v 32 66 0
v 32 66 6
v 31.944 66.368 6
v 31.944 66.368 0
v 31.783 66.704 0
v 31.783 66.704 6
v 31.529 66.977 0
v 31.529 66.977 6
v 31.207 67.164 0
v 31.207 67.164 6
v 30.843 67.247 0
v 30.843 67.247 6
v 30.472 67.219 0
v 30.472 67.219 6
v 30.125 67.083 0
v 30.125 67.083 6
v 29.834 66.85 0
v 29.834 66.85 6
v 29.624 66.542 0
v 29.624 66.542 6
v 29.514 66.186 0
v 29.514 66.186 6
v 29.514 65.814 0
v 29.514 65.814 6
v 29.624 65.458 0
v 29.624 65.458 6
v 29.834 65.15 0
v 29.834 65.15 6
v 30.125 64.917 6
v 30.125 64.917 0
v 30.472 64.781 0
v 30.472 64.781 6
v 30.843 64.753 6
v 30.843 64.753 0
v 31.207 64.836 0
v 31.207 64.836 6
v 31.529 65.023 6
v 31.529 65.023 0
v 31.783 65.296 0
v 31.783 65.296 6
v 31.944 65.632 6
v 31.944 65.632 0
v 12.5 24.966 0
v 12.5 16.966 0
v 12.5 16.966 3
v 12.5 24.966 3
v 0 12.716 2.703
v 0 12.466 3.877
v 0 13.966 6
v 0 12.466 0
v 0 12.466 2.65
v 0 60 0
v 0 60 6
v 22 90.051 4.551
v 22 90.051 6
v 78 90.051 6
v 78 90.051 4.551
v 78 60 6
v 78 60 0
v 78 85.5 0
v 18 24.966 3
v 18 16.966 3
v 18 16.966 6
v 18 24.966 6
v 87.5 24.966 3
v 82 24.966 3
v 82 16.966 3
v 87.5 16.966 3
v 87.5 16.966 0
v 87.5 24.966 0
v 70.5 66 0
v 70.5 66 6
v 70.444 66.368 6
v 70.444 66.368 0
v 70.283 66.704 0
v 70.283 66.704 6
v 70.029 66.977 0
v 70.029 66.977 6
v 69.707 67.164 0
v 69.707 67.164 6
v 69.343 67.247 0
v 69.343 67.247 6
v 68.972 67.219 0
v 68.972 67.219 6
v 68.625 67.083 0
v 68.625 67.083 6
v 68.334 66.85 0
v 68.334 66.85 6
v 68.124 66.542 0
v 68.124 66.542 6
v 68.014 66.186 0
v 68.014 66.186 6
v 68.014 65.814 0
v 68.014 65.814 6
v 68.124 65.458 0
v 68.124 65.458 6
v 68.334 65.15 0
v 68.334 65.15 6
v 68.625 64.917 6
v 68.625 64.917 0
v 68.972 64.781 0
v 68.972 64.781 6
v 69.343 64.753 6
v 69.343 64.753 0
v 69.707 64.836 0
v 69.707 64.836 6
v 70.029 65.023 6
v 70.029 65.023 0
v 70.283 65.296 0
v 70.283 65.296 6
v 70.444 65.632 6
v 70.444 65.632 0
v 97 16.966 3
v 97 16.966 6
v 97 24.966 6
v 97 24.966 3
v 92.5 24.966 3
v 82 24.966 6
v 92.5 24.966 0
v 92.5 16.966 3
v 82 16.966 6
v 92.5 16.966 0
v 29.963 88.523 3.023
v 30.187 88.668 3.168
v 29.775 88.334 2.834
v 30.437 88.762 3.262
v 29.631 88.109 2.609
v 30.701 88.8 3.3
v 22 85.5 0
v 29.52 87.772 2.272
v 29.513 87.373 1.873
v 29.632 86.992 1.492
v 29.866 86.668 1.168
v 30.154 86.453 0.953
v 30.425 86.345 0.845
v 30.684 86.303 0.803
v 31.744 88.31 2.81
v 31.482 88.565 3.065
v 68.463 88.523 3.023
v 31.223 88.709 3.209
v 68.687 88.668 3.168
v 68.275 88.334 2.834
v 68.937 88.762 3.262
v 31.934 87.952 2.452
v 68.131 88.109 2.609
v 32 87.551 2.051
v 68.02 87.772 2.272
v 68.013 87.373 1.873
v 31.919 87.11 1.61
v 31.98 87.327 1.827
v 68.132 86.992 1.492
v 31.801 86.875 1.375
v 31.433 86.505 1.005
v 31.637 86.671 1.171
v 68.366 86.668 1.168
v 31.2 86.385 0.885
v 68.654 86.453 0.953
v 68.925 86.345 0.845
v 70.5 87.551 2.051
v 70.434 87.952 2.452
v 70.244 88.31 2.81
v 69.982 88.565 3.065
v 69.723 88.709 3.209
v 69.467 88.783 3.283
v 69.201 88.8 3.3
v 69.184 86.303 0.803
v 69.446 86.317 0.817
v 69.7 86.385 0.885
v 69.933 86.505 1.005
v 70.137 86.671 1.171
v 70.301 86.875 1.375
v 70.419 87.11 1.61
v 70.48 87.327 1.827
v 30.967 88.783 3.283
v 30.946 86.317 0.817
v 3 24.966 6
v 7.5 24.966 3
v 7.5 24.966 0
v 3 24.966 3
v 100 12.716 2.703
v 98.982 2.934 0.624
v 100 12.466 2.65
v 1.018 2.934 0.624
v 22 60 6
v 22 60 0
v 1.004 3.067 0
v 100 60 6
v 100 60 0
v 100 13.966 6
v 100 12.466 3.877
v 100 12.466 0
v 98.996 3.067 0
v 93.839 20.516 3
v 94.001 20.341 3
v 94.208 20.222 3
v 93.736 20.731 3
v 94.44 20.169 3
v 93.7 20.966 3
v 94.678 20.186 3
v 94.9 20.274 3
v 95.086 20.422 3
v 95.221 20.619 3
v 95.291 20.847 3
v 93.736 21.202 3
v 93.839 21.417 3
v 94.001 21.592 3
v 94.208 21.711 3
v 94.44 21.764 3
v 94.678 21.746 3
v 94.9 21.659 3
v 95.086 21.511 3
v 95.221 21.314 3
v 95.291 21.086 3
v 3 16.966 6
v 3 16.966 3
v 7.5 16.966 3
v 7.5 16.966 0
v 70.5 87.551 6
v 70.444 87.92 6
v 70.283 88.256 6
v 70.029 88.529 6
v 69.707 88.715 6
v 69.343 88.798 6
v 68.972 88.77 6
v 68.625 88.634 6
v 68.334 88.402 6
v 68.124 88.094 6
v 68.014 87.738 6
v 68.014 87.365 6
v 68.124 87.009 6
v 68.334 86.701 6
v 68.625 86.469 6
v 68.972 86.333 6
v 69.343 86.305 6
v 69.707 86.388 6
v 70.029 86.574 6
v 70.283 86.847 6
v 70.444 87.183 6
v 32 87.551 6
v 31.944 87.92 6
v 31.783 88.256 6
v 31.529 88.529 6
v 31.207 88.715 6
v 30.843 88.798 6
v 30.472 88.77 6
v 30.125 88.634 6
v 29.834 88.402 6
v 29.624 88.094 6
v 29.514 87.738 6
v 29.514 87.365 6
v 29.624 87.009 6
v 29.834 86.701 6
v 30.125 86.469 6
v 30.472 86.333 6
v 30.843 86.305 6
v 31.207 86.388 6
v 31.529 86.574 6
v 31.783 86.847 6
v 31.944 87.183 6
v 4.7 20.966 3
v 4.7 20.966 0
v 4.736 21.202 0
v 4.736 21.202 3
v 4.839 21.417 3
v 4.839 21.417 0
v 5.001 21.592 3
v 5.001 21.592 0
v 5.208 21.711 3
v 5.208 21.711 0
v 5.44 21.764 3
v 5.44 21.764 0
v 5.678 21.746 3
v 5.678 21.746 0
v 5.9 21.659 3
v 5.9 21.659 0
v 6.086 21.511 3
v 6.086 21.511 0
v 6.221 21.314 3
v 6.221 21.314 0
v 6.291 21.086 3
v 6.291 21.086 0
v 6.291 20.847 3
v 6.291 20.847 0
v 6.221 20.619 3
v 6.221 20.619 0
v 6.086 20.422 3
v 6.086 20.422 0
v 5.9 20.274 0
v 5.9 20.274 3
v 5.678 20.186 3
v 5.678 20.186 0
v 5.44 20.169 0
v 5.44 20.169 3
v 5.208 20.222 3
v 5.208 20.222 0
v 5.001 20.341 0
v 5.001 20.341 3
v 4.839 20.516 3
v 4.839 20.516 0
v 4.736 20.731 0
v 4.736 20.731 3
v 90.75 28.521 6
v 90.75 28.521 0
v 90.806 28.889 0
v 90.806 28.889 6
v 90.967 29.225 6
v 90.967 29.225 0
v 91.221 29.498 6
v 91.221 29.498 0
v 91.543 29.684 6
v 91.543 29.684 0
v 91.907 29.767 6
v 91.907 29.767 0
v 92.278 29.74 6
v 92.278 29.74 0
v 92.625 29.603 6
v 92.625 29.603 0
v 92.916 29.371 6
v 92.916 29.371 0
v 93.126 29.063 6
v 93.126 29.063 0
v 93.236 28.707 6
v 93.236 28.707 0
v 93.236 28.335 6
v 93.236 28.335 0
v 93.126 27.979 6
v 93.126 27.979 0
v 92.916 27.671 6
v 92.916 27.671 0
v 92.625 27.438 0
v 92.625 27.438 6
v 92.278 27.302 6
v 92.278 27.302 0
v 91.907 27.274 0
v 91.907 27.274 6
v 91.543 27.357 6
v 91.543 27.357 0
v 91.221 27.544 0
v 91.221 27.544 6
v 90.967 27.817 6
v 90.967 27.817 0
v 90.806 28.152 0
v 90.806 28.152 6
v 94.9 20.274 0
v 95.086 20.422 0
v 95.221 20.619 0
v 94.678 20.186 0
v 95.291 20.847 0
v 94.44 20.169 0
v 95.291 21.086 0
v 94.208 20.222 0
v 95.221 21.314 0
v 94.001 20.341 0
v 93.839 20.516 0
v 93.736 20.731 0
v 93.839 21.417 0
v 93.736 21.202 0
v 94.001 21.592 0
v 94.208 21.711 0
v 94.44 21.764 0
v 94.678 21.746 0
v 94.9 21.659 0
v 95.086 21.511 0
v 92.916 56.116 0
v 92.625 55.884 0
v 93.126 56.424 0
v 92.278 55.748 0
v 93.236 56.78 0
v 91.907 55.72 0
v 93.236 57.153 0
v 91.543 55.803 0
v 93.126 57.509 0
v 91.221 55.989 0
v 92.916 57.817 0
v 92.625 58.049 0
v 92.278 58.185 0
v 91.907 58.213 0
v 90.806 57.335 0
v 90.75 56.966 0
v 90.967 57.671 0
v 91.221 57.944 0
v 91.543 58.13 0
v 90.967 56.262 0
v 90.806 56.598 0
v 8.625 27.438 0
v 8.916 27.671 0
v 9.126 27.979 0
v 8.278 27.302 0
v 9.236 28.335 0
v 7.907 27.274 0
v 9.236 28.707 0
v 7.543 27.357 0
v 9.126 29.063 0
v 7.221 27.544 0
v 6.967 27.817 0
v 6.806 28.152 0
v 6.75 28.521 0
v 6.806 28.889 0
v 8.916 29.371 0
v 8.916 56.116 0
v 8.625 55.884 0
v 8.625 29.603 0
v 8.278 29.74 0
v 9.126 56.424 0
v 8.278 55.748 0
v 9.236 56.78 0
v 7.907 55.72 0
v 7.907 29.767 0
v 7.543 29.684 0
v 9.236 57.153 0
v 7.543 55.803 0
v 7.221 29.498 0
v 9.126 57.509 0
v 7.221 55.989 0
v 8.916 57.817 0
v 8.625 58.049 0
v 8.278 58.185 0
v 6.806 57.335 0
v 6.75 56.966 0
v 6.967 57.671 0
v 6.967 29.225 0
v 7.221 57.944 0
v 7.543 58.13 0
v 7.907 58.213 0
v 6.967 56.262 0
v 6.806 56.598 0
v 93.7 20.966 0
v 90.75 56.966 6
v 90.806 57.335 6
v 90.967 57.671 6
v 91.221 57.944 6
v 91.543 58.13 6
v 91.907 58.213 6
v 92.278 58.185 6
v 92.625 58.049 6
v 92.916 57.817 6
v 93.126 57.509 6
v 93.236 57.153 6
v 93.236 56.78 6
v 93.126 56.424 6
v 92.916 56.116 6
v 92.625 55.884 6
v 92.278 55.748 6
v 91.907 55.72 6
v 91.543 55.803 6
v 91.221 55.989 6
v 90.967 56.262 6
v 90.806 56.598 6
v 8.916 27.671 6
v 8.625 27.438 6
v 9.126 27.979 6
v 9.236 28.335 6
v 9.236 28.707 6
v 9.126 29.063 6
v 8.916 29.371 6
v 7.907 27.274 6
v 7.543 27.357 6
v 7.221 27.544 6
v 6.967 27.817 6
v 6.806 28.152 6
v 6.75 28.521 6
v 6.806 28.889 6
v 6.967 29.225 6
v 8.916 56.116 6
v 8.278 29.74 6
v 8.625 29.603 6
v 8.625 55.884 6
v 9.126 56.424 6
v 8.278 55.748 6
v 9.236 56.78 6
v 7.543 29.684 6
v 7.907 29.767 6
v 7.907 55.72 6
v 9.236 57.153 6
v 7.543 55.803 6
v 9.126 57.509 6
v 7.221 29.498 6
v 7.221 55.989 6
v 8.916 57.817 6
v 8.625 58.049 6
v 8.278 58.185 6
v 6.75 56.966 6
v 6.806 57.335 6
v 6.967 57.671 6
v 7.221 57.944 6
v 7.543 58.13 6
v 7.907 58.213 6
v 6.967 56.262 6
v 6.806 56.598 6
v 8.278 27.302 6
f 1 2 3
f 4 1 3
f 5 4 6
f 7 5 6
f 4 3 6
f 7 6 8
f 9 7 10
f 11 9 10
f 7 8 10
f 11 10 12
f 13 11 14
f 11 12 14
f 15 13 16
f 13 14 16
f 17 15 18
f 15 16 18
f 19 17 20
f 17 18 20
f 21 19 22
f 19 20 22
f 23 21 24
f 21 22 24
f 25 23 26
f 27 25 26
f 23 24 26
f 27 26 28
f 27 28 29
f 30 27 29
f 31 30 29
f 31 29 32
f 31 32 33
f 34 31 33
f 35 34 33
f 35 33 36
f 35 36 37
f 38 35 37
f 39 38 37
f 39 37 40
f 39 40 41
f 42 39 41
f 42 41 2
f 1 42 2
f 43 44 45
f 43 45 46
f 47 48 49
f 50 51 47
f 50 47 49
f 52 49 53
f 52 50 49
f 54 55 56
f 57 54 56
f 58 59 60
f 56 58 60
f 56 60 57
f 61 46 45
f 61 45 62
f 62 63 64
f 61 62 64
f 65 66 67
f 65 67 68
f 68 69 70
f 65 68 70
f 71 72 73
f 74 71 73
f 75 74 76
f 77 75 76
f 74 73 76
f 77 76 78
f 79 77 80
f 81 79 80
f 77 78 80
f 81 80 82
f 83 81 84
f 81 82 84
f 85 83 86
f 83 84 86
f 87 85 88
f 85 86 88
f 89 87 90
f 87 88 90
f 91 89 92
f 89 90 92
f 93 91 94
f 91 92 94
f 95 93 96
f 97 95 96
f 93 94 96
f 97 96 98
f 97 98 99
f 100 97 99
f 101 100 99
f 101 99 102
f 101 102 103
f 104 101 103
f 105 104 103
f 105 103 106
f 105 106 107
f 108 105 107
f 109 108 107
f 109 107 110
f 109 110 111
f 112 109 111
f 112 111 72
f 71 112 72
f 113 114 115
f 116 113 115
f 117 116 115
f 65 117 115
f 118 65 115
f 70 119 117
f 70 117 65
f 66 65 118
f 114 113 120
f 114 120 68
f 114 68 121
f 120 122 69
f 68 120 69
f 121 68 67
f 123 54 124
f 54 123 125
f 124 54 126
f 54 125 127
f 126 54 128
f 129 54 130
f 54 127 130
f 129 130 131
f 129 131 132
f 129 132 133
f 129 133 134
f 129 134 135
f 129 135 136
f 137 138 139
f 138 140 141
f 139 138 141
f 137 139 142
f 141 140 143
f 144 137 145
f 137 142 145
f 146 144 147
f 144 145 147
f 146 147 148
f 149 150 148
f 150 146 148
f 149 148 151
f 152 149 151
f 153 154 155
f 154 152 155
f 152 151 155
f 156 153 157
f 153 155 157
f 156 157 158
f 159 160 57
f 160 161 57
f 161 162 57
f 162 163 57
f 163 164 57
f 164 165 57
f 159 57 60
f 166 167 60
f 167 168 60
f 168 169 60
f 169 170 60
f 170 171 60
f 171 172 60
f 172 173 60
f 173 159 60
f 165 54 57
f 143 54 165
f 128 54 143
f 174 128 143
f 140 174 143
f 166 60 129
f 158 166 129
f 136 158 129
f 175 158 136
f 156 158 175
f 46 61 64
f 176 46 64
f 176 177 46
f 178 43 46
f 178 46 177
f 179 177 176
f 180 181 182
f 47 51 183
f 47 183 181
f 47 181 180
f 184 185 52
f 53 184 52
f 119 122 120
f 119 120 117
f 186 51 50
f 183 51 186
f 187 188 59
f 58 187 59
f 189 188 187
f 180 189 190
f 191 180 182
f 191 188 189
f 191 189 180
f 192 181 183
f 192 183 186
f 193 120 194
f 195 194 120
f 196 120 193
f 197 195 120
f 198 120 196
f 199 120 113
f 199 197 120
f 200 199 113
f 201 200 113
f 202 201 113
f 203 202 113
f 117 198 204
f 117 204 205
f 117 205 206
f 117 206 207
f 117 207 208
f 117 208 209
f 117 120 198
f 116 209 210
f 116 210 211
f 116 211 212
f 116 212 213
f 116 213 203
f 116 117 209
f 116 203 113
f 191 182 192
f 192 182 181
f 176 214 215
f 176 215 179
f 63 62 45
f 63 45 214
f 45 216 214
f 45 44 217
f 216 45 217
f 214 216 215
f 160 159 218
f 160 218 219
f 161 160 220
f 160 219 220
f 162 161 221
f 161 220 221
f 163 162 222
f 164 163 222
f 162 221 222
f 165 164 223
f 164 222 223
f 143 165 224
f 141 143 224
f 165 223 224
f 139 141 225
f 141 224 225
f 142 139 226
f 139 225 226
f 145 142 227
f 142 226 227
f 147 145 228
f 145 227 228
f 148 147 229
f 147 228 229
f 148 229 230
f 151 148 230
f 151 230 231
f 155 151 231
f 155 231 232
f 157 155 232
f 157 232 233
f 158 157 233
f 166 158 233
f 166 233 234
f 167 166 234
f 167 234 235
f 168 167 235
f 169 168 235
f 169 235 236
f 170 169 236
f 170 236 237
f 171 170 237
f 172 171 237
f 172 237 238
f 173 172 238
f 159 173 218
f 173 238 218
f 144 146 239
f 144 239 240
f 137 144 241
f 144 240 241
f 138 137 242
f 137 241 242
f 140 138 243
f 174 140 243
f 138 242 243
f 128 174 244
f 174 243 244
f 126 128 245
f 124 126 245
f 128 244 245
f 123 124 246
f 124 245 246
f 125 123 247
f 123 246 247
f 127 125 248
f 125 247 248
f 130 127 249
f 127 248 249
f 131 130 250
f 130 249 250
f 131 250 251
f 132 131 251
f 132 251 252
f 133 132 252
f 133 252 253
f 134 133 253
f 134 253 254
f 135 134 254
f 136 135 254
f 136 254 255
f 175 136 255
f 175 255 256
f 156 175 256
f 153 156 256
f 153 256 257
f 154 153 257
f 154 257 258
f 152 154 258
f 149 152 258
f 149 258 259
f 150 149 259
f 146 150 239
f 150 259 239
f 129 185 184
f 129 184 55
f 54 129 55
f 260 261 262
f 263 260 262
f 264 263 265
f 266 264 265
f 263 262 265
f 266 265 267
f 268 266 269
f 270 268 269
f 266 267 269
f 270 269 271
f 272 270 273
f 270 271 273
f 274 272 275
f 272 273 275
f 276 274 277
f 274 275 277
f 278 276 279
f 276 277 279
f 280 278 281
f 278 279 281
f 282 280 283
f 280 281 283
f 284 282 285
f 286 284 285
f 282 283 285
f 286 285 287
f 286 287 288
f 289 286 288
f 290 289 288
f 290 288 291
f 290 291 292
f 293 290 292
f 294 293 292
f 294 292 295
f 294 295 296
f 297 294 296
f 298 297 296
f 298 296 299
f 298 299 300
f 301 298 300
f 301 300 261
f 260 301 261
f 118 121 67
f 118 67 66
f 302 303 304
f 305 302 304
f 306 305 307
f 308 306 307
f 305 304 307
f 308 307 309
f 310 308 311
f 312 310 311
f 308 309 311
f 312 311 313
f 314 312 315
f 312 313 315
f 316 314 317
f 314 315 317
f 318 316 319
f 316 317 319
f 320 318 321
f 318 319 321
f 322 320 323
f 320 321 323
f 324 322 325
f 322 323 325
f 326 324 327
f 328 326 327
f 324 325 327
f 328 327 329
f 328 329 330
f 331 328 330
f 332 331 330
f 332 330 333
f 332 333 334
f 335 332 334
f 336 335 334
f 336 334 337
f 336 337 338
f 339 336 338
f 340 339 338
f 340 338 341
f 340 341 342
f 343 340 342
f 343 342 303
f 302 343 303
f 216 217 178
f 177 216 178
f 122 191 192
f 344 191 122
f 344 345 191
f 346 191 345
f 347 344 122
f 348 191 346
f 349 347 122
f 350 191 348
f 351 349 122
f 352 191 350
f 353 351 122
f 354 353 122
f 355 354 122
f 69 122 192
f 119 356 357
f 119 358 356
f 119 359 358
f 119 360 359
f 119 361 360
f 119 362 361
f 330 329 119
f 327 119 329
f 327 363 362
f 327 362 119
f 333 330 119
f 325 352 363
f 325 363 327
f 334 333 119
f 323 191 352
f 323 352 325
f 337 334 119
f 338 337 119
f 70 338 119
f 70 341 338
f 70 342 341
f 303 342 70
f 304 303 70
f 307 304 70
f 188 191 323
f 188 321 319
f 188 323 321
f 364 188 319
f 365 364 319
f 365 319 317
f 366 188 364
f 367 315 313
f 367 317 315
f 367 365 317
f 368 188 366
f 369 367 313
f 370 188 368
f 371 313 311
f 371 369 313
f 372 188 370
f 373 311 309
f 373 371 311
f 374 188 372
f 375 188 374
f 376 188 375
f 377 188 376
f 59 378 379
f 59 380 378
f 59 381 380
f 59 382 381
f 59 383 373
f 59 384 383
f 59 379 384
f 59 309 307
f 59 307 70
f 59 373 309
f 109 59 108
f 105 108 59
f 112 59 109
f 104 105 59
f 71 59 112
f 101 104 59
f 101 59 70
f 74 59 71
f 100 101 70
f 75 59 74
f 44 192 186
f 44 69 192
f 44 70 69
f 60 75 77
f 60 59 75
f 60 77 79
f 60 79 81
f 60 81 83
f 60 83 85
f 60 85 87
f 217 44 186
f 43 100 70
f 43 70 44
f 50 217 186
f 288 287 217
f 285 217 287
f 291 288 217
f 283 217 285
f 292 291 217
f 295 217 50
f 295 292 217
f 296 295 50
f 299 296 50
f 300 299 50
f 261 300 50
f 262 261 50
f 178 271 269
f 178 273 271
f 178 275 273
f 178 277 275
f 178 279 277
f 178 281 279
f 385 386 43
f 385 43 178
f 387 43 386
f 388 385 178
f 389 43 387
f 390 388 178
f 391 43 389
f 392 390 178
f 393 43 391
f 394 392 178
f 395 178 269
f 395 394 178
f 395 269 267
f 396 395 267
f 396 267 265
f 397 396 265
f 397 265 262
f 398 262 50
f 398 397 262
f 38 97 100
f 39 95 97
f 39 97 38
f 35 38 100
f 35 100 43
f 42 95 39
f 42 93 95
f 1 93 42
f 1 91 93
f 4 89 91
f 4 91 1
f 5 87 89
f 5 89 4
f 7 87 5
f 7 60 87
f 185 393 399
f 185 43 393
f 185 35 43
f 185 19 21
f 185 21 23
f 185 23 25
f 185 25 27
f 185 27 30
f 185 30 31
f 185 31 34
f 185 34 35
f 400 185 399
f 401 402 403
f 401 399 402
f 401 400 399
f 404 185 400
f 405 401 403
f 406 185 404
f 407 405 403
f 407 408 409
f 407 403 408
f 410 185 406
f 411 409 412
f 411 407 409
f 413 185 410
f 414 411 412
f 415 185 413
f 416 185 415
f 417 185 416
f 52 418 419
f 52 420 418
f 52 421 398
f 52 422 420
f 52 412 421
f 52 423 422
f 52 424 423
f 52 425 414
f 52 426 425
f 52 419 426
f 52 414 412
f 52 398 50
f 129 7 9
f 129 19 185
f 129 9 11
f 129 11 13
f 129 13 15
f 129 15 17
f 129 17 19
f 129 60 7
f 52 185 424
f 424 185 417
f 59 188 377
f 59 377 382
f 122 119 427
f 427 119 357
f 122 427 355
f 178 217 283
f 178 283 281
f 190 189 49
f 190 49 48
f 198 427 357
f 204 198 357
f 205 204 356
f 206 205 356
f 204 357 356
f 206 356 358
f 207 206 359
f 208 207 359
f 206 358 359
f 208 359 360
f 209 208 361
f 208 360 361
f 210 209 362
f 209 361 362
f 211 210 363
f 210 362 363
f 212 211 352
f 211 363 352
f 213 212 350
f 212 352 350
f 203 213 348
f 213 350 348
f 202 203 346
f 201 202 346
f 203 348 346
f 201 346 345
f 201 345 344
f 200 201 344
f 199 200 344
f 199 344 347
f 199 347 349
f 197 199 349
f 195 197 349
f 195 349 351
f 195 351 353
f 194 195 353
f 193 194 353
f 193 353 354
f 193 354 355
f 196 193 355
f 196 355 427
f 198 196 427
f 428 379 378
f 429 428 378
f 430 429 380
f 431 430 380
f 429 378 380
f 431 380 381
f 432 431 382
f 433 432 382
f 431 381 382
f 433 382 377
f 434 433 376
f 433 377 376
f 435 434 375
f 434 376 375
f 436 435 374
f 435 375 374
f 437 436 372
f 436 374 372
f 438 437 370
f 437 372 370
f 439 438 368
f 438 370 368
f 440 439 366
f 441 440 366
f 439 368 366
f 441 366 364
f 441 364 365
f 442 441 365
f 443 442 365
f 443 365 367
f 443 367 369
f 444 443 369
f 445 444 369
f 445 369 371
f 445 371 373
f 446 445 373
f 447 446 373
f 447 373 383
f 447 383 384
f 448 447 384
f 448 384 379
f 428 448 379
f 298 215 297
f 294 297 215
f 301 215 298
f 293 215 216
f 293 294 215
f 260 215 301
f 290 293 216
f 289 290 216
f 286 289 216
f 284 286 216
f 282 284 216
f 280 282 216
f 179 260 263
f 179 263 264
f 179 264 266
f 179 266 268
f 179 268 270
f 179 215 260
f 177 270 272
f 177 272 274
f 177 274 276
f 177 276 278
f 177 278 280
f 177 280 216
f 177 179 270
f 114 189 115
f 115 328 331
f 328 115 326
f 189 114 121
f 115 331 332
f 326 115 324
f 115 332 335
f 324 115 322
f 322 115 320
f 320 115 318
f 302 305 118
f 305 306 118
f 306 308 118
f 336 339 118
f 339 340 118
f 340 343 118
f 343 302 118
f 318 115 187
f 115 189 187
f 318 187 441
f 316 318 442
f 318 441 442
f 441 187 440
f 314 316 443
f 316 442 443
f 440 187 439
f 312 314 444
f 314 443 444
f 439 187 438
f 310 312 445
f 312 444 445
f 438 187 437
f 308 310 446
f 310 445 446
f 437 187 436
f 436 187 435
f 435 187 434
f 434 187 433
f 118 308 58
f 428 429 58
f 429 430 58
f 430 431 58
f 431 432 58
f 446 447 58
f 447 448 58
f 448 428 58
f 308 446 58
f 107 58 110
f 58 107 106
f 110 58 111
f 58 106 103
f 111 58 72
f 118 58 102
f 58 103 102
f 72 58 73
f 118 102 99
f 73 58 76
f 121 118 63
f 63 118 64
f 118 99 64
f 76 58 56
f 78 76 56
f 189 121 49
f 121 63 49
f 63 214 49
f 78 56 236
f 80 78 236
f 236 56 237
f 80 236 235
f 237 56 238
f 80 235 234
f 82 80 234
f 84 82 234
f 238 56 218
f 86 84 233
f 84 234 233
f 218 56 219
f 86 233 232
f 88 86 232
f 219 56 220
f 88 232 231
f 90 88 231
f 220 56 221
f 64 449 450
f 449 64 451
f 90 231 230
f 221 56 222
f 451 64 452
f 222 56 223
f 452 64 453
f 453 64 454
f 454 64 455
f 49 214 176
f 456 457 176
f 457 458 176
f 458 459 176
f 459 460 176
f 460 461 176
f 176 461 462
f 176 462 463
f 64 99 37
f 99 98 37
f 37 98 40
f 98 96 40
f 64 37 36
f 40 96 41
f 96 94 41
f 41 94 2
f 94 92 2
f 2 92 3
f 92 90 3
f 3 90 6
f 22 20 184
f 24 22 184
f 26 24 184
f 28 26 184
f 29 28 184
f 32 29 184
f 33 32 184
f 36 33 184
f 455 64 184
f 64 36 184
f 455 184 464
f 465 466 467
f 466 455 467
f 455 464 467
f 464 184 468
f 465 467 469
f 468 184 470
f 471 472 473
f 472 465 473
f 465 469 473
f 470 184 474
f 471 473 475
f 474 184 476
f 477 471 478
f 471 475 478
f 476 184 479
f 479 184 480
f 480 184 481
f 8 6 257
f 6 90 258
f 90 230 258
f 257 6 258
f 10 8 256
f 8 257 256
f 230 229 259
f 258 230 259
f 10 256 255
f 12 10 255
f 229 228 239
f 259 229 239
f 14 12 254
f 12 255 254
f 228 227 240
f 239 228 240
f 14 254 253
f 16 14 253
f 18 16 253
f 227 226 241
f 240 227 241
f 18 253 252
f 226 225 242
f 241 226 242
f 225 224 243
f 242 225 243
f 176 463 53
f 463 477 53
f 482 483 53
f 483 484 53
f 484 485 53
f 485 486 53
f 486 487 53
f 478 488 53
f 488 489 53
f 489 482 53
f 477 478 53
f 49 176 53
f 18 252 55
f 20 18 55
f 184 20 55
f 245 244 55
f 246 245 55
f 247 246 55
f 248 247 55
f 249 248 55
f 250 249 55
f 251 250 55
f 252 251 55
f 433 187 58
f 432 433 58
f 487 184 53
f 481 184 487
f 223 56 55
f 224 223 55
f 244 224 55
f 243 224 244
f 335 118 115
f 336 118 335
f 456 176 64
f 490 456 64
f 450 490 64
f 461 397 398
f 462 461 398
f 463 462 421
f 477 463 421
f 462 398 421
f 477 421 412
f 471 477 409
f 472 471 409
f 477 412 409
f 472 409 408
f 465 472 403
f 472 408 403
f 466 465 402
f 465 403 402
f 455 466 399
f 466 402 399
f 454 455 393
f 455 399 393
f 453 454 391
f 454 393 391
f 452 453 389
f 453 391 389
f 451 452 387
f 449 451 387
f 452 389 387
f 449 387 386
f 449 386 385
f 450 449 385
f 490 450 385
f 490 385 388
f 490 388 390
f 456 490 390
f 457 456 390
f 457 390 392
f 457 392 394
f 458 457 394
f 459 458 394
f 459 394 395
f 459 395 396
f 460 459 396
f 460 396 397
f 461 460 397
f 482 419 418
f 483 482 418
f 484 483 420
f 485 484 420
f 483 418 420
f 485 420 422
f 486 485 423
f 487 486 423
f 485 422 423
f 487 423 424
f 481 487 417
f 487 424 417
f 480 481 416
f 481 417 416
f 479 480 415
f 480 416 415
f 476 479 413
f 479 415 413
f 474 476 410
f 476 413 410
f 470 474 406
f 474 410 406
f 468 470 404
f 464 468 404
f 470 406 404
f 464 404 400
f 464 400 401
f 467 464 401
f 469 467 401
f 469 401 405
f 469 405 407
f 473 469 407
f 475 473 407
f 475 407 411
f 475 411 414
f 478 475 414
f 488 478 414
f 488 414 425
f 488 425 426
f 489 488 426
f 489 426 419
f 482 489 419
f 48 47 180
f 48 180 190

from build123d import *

# Parameters (mm, degrees)
RESSALTO_EXTRUS_O1_DEPTH                = 6
CORTE_EXTRUS_O1_DEPTH                   = 100
CORTE_EXTRUS_O2_DEPTH                   = 100
CORTE_EXTRUS_O3_DEPTH                   = 100
FILETE1_R                               = 0.1
CORTE_EXTRUS_O4_DEPTH                   = 100
BROCA_DE_ROSQUEAR_PARA_TARRAXA_DE_M31_D = 2.5
ESBO_O9_W                               = 15
ESBO_O9_H                               = 8
CORTE_EXTRUS_O5_DEPTH                   = 3
ESBO_O10_W                              = 5
ESBO_O10_H                              = 8
CORTE_EXTRUS_O6_DEPTH                   = 3
BROCA_DE_ROSQUEAR_PARA_TARRAXA_DE_M21_D = 1.6
BROCA_DE_ROSQUEAR_PARA_TARRAXA_DE_M32_D = 2.5
ESBO_O15_W                              = 56.265856886
ESBO_O15_H                              = 5.410018906
CORTE_EXTRUS_O7_DEPTH                   = 5
ESBO_O16_W                              = 22
ESBO_O16_H                              = 2
CORTE_EXTRUS_O8_DEPTH                   = 10
CORTE_EXTRUS_O9_DEPTH                   = 100


with BuildPart() as part:
    # Esboço1 → Ressalto-extrusão1 (new body)
    with BuildSketch(Plane.XY):
        Polygon((0, 62), (22, 62), (22, 96), (78, 96), (78, 62), (100, 62), (100, 0), (0, 0), align=None)
    extrude(amount=RESSALTO_EXTRUS_O1_DEPTH)

    # Esboço2 → Corte-extrusão1 (cut)
    with BuildSketch(Plane.ZY):
        Polygon((0, 0), (2.702851981, 12.71591881), (4.274929738, 12.381763367), (4.34595667, 12.71591881), (6, 12.71591881), (6, 0), align=None)
    extrude(amount=-CORTE_EXTRUS_O1_DEPTH, mode=Mode.SUBTRACT)

    # Esboço3 → Corte-extrusão2 (cut)
    with BuildSketch(Plane(origin=(78, 0, 0), x_dir=(0, 0, -1), z_dir=(1, 0, 0))):
        Polygon((-6, 91.5), (0, 85.5), (0, 96), (-6, 96), align=None)
    extrude(amount=-CORTE_EXTRUS_O2_DEPTH, mode=Mode.SUBTRACT)

    # Esboço4 → Corte-extrusão3 (cut)
    with BuildSketch(Plane(origin=(100, 0, 0), x_dir=(0, 0, -1), z_dir=(1, 0, 0))):
        Polygon((-3.876629102, 12.466424781), (-6, 11.831800832), (-6, 13.966424781), align=None)
    extrude(amount=-CORTE_EXTRUS_O3_DEPTH, mode=Mode.SUBTRACT)

    # Filete1
    filete1_edges = [part.edges().sort_by_distance(p)[0] for p in [
        (50, 0, 0),
    ]]
    fillet(filete1_edges, radius=FILETE1_R)

    # Esboço5 → Corte-extrusão4 (cut)
    with BuildSketch(Plane.XY.offset(6)):
        Polygon((0, 12.466424781), (1.313793103, 0.168697266), (0, 0.851436445), align=None)
        Polygon((100, 12.466424781), (98.686206897, 0.168697266), (100, 0.851436445), align=None)
    extrude(amount=-CORTE_EXTRUS_O4_DEPTH, mode=Mode.SUBTRACT)

    # Broca de rosquear para tarraxa de M31 (through all)
    with Locations(Plane.XY.offset(6)):
        with Locations((92, 56.966424781), (92, 28.520905026), (8, 56.966424781), (8, 28.520905026)):
            Hole(BROCA_DE_ROSQUEAR_PARA_TARRAXA_DE_M31_D / 2)

    # Esboço9 → Corte-extrusão5 (cut)
    with BuildSketch(Plane.XY.offset(6)):
        with Locations((10.5, 20.966424781)):
            Rectangle(ESBO_O9_W, ESBO_O9_H)
        with Locations((89.5, 20.966424781)):
            Rectangle(ESBO_O9_W, ESBO_O9_H)
    extrude(amount=-CORTE_EXTRUS_O5_DEPTH, mode=Mode.SUBTRACT)

    # Esboço10 → Corte-extrusão6 (cut)
    with BuildSketch(Plane(origin=(0, 0, 0), x_dir=(-1, 0, 0), z_dir=(0, 0, -1))):
        with Locations((-90, 20.966424781)):
            Rectangle(ESBO_O10_W, ESBO_O10_H)
        with Locations((-10, 20.966424781)):
            Rectangle(ESBO_O10_W, ESBO_O10_H)
    extrude(amount=-CORTE_EXTRUS_O6_DEPTH, mode=Mode.SUBTRACT)

    # Broca de rosquear para tarraxa de M21 (through all)
    with Locations(Plane.XY.offset(3)):
        with Locations((5.4999996, 20.966424401), (94.5000004, 20.966425161)):
            Hole(BROCA_DE_ROSQUEAR_PARA_TARRAXA_DE_M21_D / 2)

    # Broca de rosquear para tarraxa de M32 (through all)
    with Locations(Plane(origin=(0, 0, 0), x_dir=(-1, 0, 0), z_dir=(0, 0, -1))):
        with Locations((-30.75, 66), (-69.25, 66), (-69.25, 87.551471863), (-30.75, 87.551471863)):
            Hole(BROCA_DE_ROSQUEAR_PARA_TARRAXA_DE_M32_D / 2)

    # Esboço15 → Corte-extrusão7 (cut)
    with BuildSketch(Plane.XY.offset(6)):
        with Locations((50.132928443, 92.756481316)):
            Rectangle(ESBO_O15_W, ESBO_O15_H)
    extrude(amount=-CORTE_EXTRUS_O7_DEPTH, mode=Mode.SUBTRACT)

    # Esboço16 → Corte-extrusão8 (cut)
    with BuildSketch(Plane(origin=(0, 0, 0), x_dir=(-1, 0, 0), z_dir=(0, 0, -1))):
        with Locations((-11, 61)):
            Rectangle(ESBO_O16_W, ESBO_O16_H)
        with Locations((-89, 61)):
            Rectangle(ESBO_O16_W, ESBO_O16_H)
    extrude(amount=-CORTE_EXTRUS_O8_DEPTH, mode=Mode.SUBTRACT)

    # Esboço17 → Corte-extrusão9 (cut)
    with BuildSketch(Plane.ZY):
        Polygon((0.623735072, 2.934442802), (0, 3.067021785), (0, 0), align=None)
    extrude(amount=-CORTE_EXTRUS_O9_DEPTH, mode=Mode.SUBTRACT)


solid = part.part
